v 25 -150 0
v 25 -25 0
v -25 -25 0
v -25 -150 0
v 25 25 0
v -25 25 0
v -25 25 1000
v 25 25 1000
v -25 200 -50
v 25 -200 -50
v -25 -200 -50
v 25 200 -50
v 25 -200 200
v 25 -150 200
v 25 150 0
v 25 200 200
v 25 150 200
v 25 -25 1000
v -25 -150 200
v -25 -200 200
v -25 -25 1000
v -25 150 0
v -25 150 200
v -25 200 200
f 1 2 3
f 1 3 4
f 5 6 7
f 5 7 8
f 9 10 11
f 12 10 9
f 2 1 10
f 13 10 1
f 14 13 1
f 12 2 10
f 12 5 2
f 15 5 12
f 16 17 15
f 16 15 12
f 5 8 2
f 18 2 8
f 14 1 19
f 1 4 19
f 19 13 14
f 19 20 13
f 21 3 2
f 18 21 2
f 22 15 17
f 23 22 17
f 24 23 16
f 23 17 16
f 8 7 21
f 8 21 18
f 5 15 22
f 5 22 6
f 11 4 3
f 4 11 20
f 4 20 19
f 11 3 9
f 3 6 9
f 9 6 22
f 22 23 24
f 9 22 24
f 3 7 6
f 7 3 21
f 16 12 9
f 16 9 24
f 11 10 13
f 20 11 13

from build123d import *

# Parameters (mm, degrees)
F0_W          = 50
F0_H          = 50
F1_DEPTH      = 1000
F2_W          = 200
F2_H          = 50
F3_DEPTH      = 25
F3_DEPTH_BACK = 25
F4_W          = 50
F4_H          = 200
F5_DEPTH      = 25
F5_DEPTH_BACK = 25


with BuildPart() as f1:
    # F0 (on Top) → F1 (new body)
    with BuildSketch(Plane.XY):
        Rectangle(F0_W, F0_H)
    extrude(amount=F1_DEPTH)

    # F2 (on Right) → F3 (join, two sides)
    with BuildSketch(Plane.YZ) as f3_sk:
        with Locations((-100, -25)):
            Rectangle(F2_W, F2_H)
        with Locations((100, -25)):
            Rectangle(F2_W, F2_H)
    extrude(amount=F3_DEPTH)
    extrude(f3_sk.sketch, amount=-F3_DEPTH_BACK)

    # F4 (on Right) → F5 (join, two sides)
    with BuildSketch(Plane.YZ) as f5_sk:
        with Locations((175, 100)):
            Rectangle(F4_W, F4_H)
        with Locations((-175, 100)):
            Rectangle(F4_W, F4_H)
    extrude(amount=F5_DEPTH)
    extrude(f5_sk.sketch, amount=-F5_DEPTH_BACK)


solid = f1.part
